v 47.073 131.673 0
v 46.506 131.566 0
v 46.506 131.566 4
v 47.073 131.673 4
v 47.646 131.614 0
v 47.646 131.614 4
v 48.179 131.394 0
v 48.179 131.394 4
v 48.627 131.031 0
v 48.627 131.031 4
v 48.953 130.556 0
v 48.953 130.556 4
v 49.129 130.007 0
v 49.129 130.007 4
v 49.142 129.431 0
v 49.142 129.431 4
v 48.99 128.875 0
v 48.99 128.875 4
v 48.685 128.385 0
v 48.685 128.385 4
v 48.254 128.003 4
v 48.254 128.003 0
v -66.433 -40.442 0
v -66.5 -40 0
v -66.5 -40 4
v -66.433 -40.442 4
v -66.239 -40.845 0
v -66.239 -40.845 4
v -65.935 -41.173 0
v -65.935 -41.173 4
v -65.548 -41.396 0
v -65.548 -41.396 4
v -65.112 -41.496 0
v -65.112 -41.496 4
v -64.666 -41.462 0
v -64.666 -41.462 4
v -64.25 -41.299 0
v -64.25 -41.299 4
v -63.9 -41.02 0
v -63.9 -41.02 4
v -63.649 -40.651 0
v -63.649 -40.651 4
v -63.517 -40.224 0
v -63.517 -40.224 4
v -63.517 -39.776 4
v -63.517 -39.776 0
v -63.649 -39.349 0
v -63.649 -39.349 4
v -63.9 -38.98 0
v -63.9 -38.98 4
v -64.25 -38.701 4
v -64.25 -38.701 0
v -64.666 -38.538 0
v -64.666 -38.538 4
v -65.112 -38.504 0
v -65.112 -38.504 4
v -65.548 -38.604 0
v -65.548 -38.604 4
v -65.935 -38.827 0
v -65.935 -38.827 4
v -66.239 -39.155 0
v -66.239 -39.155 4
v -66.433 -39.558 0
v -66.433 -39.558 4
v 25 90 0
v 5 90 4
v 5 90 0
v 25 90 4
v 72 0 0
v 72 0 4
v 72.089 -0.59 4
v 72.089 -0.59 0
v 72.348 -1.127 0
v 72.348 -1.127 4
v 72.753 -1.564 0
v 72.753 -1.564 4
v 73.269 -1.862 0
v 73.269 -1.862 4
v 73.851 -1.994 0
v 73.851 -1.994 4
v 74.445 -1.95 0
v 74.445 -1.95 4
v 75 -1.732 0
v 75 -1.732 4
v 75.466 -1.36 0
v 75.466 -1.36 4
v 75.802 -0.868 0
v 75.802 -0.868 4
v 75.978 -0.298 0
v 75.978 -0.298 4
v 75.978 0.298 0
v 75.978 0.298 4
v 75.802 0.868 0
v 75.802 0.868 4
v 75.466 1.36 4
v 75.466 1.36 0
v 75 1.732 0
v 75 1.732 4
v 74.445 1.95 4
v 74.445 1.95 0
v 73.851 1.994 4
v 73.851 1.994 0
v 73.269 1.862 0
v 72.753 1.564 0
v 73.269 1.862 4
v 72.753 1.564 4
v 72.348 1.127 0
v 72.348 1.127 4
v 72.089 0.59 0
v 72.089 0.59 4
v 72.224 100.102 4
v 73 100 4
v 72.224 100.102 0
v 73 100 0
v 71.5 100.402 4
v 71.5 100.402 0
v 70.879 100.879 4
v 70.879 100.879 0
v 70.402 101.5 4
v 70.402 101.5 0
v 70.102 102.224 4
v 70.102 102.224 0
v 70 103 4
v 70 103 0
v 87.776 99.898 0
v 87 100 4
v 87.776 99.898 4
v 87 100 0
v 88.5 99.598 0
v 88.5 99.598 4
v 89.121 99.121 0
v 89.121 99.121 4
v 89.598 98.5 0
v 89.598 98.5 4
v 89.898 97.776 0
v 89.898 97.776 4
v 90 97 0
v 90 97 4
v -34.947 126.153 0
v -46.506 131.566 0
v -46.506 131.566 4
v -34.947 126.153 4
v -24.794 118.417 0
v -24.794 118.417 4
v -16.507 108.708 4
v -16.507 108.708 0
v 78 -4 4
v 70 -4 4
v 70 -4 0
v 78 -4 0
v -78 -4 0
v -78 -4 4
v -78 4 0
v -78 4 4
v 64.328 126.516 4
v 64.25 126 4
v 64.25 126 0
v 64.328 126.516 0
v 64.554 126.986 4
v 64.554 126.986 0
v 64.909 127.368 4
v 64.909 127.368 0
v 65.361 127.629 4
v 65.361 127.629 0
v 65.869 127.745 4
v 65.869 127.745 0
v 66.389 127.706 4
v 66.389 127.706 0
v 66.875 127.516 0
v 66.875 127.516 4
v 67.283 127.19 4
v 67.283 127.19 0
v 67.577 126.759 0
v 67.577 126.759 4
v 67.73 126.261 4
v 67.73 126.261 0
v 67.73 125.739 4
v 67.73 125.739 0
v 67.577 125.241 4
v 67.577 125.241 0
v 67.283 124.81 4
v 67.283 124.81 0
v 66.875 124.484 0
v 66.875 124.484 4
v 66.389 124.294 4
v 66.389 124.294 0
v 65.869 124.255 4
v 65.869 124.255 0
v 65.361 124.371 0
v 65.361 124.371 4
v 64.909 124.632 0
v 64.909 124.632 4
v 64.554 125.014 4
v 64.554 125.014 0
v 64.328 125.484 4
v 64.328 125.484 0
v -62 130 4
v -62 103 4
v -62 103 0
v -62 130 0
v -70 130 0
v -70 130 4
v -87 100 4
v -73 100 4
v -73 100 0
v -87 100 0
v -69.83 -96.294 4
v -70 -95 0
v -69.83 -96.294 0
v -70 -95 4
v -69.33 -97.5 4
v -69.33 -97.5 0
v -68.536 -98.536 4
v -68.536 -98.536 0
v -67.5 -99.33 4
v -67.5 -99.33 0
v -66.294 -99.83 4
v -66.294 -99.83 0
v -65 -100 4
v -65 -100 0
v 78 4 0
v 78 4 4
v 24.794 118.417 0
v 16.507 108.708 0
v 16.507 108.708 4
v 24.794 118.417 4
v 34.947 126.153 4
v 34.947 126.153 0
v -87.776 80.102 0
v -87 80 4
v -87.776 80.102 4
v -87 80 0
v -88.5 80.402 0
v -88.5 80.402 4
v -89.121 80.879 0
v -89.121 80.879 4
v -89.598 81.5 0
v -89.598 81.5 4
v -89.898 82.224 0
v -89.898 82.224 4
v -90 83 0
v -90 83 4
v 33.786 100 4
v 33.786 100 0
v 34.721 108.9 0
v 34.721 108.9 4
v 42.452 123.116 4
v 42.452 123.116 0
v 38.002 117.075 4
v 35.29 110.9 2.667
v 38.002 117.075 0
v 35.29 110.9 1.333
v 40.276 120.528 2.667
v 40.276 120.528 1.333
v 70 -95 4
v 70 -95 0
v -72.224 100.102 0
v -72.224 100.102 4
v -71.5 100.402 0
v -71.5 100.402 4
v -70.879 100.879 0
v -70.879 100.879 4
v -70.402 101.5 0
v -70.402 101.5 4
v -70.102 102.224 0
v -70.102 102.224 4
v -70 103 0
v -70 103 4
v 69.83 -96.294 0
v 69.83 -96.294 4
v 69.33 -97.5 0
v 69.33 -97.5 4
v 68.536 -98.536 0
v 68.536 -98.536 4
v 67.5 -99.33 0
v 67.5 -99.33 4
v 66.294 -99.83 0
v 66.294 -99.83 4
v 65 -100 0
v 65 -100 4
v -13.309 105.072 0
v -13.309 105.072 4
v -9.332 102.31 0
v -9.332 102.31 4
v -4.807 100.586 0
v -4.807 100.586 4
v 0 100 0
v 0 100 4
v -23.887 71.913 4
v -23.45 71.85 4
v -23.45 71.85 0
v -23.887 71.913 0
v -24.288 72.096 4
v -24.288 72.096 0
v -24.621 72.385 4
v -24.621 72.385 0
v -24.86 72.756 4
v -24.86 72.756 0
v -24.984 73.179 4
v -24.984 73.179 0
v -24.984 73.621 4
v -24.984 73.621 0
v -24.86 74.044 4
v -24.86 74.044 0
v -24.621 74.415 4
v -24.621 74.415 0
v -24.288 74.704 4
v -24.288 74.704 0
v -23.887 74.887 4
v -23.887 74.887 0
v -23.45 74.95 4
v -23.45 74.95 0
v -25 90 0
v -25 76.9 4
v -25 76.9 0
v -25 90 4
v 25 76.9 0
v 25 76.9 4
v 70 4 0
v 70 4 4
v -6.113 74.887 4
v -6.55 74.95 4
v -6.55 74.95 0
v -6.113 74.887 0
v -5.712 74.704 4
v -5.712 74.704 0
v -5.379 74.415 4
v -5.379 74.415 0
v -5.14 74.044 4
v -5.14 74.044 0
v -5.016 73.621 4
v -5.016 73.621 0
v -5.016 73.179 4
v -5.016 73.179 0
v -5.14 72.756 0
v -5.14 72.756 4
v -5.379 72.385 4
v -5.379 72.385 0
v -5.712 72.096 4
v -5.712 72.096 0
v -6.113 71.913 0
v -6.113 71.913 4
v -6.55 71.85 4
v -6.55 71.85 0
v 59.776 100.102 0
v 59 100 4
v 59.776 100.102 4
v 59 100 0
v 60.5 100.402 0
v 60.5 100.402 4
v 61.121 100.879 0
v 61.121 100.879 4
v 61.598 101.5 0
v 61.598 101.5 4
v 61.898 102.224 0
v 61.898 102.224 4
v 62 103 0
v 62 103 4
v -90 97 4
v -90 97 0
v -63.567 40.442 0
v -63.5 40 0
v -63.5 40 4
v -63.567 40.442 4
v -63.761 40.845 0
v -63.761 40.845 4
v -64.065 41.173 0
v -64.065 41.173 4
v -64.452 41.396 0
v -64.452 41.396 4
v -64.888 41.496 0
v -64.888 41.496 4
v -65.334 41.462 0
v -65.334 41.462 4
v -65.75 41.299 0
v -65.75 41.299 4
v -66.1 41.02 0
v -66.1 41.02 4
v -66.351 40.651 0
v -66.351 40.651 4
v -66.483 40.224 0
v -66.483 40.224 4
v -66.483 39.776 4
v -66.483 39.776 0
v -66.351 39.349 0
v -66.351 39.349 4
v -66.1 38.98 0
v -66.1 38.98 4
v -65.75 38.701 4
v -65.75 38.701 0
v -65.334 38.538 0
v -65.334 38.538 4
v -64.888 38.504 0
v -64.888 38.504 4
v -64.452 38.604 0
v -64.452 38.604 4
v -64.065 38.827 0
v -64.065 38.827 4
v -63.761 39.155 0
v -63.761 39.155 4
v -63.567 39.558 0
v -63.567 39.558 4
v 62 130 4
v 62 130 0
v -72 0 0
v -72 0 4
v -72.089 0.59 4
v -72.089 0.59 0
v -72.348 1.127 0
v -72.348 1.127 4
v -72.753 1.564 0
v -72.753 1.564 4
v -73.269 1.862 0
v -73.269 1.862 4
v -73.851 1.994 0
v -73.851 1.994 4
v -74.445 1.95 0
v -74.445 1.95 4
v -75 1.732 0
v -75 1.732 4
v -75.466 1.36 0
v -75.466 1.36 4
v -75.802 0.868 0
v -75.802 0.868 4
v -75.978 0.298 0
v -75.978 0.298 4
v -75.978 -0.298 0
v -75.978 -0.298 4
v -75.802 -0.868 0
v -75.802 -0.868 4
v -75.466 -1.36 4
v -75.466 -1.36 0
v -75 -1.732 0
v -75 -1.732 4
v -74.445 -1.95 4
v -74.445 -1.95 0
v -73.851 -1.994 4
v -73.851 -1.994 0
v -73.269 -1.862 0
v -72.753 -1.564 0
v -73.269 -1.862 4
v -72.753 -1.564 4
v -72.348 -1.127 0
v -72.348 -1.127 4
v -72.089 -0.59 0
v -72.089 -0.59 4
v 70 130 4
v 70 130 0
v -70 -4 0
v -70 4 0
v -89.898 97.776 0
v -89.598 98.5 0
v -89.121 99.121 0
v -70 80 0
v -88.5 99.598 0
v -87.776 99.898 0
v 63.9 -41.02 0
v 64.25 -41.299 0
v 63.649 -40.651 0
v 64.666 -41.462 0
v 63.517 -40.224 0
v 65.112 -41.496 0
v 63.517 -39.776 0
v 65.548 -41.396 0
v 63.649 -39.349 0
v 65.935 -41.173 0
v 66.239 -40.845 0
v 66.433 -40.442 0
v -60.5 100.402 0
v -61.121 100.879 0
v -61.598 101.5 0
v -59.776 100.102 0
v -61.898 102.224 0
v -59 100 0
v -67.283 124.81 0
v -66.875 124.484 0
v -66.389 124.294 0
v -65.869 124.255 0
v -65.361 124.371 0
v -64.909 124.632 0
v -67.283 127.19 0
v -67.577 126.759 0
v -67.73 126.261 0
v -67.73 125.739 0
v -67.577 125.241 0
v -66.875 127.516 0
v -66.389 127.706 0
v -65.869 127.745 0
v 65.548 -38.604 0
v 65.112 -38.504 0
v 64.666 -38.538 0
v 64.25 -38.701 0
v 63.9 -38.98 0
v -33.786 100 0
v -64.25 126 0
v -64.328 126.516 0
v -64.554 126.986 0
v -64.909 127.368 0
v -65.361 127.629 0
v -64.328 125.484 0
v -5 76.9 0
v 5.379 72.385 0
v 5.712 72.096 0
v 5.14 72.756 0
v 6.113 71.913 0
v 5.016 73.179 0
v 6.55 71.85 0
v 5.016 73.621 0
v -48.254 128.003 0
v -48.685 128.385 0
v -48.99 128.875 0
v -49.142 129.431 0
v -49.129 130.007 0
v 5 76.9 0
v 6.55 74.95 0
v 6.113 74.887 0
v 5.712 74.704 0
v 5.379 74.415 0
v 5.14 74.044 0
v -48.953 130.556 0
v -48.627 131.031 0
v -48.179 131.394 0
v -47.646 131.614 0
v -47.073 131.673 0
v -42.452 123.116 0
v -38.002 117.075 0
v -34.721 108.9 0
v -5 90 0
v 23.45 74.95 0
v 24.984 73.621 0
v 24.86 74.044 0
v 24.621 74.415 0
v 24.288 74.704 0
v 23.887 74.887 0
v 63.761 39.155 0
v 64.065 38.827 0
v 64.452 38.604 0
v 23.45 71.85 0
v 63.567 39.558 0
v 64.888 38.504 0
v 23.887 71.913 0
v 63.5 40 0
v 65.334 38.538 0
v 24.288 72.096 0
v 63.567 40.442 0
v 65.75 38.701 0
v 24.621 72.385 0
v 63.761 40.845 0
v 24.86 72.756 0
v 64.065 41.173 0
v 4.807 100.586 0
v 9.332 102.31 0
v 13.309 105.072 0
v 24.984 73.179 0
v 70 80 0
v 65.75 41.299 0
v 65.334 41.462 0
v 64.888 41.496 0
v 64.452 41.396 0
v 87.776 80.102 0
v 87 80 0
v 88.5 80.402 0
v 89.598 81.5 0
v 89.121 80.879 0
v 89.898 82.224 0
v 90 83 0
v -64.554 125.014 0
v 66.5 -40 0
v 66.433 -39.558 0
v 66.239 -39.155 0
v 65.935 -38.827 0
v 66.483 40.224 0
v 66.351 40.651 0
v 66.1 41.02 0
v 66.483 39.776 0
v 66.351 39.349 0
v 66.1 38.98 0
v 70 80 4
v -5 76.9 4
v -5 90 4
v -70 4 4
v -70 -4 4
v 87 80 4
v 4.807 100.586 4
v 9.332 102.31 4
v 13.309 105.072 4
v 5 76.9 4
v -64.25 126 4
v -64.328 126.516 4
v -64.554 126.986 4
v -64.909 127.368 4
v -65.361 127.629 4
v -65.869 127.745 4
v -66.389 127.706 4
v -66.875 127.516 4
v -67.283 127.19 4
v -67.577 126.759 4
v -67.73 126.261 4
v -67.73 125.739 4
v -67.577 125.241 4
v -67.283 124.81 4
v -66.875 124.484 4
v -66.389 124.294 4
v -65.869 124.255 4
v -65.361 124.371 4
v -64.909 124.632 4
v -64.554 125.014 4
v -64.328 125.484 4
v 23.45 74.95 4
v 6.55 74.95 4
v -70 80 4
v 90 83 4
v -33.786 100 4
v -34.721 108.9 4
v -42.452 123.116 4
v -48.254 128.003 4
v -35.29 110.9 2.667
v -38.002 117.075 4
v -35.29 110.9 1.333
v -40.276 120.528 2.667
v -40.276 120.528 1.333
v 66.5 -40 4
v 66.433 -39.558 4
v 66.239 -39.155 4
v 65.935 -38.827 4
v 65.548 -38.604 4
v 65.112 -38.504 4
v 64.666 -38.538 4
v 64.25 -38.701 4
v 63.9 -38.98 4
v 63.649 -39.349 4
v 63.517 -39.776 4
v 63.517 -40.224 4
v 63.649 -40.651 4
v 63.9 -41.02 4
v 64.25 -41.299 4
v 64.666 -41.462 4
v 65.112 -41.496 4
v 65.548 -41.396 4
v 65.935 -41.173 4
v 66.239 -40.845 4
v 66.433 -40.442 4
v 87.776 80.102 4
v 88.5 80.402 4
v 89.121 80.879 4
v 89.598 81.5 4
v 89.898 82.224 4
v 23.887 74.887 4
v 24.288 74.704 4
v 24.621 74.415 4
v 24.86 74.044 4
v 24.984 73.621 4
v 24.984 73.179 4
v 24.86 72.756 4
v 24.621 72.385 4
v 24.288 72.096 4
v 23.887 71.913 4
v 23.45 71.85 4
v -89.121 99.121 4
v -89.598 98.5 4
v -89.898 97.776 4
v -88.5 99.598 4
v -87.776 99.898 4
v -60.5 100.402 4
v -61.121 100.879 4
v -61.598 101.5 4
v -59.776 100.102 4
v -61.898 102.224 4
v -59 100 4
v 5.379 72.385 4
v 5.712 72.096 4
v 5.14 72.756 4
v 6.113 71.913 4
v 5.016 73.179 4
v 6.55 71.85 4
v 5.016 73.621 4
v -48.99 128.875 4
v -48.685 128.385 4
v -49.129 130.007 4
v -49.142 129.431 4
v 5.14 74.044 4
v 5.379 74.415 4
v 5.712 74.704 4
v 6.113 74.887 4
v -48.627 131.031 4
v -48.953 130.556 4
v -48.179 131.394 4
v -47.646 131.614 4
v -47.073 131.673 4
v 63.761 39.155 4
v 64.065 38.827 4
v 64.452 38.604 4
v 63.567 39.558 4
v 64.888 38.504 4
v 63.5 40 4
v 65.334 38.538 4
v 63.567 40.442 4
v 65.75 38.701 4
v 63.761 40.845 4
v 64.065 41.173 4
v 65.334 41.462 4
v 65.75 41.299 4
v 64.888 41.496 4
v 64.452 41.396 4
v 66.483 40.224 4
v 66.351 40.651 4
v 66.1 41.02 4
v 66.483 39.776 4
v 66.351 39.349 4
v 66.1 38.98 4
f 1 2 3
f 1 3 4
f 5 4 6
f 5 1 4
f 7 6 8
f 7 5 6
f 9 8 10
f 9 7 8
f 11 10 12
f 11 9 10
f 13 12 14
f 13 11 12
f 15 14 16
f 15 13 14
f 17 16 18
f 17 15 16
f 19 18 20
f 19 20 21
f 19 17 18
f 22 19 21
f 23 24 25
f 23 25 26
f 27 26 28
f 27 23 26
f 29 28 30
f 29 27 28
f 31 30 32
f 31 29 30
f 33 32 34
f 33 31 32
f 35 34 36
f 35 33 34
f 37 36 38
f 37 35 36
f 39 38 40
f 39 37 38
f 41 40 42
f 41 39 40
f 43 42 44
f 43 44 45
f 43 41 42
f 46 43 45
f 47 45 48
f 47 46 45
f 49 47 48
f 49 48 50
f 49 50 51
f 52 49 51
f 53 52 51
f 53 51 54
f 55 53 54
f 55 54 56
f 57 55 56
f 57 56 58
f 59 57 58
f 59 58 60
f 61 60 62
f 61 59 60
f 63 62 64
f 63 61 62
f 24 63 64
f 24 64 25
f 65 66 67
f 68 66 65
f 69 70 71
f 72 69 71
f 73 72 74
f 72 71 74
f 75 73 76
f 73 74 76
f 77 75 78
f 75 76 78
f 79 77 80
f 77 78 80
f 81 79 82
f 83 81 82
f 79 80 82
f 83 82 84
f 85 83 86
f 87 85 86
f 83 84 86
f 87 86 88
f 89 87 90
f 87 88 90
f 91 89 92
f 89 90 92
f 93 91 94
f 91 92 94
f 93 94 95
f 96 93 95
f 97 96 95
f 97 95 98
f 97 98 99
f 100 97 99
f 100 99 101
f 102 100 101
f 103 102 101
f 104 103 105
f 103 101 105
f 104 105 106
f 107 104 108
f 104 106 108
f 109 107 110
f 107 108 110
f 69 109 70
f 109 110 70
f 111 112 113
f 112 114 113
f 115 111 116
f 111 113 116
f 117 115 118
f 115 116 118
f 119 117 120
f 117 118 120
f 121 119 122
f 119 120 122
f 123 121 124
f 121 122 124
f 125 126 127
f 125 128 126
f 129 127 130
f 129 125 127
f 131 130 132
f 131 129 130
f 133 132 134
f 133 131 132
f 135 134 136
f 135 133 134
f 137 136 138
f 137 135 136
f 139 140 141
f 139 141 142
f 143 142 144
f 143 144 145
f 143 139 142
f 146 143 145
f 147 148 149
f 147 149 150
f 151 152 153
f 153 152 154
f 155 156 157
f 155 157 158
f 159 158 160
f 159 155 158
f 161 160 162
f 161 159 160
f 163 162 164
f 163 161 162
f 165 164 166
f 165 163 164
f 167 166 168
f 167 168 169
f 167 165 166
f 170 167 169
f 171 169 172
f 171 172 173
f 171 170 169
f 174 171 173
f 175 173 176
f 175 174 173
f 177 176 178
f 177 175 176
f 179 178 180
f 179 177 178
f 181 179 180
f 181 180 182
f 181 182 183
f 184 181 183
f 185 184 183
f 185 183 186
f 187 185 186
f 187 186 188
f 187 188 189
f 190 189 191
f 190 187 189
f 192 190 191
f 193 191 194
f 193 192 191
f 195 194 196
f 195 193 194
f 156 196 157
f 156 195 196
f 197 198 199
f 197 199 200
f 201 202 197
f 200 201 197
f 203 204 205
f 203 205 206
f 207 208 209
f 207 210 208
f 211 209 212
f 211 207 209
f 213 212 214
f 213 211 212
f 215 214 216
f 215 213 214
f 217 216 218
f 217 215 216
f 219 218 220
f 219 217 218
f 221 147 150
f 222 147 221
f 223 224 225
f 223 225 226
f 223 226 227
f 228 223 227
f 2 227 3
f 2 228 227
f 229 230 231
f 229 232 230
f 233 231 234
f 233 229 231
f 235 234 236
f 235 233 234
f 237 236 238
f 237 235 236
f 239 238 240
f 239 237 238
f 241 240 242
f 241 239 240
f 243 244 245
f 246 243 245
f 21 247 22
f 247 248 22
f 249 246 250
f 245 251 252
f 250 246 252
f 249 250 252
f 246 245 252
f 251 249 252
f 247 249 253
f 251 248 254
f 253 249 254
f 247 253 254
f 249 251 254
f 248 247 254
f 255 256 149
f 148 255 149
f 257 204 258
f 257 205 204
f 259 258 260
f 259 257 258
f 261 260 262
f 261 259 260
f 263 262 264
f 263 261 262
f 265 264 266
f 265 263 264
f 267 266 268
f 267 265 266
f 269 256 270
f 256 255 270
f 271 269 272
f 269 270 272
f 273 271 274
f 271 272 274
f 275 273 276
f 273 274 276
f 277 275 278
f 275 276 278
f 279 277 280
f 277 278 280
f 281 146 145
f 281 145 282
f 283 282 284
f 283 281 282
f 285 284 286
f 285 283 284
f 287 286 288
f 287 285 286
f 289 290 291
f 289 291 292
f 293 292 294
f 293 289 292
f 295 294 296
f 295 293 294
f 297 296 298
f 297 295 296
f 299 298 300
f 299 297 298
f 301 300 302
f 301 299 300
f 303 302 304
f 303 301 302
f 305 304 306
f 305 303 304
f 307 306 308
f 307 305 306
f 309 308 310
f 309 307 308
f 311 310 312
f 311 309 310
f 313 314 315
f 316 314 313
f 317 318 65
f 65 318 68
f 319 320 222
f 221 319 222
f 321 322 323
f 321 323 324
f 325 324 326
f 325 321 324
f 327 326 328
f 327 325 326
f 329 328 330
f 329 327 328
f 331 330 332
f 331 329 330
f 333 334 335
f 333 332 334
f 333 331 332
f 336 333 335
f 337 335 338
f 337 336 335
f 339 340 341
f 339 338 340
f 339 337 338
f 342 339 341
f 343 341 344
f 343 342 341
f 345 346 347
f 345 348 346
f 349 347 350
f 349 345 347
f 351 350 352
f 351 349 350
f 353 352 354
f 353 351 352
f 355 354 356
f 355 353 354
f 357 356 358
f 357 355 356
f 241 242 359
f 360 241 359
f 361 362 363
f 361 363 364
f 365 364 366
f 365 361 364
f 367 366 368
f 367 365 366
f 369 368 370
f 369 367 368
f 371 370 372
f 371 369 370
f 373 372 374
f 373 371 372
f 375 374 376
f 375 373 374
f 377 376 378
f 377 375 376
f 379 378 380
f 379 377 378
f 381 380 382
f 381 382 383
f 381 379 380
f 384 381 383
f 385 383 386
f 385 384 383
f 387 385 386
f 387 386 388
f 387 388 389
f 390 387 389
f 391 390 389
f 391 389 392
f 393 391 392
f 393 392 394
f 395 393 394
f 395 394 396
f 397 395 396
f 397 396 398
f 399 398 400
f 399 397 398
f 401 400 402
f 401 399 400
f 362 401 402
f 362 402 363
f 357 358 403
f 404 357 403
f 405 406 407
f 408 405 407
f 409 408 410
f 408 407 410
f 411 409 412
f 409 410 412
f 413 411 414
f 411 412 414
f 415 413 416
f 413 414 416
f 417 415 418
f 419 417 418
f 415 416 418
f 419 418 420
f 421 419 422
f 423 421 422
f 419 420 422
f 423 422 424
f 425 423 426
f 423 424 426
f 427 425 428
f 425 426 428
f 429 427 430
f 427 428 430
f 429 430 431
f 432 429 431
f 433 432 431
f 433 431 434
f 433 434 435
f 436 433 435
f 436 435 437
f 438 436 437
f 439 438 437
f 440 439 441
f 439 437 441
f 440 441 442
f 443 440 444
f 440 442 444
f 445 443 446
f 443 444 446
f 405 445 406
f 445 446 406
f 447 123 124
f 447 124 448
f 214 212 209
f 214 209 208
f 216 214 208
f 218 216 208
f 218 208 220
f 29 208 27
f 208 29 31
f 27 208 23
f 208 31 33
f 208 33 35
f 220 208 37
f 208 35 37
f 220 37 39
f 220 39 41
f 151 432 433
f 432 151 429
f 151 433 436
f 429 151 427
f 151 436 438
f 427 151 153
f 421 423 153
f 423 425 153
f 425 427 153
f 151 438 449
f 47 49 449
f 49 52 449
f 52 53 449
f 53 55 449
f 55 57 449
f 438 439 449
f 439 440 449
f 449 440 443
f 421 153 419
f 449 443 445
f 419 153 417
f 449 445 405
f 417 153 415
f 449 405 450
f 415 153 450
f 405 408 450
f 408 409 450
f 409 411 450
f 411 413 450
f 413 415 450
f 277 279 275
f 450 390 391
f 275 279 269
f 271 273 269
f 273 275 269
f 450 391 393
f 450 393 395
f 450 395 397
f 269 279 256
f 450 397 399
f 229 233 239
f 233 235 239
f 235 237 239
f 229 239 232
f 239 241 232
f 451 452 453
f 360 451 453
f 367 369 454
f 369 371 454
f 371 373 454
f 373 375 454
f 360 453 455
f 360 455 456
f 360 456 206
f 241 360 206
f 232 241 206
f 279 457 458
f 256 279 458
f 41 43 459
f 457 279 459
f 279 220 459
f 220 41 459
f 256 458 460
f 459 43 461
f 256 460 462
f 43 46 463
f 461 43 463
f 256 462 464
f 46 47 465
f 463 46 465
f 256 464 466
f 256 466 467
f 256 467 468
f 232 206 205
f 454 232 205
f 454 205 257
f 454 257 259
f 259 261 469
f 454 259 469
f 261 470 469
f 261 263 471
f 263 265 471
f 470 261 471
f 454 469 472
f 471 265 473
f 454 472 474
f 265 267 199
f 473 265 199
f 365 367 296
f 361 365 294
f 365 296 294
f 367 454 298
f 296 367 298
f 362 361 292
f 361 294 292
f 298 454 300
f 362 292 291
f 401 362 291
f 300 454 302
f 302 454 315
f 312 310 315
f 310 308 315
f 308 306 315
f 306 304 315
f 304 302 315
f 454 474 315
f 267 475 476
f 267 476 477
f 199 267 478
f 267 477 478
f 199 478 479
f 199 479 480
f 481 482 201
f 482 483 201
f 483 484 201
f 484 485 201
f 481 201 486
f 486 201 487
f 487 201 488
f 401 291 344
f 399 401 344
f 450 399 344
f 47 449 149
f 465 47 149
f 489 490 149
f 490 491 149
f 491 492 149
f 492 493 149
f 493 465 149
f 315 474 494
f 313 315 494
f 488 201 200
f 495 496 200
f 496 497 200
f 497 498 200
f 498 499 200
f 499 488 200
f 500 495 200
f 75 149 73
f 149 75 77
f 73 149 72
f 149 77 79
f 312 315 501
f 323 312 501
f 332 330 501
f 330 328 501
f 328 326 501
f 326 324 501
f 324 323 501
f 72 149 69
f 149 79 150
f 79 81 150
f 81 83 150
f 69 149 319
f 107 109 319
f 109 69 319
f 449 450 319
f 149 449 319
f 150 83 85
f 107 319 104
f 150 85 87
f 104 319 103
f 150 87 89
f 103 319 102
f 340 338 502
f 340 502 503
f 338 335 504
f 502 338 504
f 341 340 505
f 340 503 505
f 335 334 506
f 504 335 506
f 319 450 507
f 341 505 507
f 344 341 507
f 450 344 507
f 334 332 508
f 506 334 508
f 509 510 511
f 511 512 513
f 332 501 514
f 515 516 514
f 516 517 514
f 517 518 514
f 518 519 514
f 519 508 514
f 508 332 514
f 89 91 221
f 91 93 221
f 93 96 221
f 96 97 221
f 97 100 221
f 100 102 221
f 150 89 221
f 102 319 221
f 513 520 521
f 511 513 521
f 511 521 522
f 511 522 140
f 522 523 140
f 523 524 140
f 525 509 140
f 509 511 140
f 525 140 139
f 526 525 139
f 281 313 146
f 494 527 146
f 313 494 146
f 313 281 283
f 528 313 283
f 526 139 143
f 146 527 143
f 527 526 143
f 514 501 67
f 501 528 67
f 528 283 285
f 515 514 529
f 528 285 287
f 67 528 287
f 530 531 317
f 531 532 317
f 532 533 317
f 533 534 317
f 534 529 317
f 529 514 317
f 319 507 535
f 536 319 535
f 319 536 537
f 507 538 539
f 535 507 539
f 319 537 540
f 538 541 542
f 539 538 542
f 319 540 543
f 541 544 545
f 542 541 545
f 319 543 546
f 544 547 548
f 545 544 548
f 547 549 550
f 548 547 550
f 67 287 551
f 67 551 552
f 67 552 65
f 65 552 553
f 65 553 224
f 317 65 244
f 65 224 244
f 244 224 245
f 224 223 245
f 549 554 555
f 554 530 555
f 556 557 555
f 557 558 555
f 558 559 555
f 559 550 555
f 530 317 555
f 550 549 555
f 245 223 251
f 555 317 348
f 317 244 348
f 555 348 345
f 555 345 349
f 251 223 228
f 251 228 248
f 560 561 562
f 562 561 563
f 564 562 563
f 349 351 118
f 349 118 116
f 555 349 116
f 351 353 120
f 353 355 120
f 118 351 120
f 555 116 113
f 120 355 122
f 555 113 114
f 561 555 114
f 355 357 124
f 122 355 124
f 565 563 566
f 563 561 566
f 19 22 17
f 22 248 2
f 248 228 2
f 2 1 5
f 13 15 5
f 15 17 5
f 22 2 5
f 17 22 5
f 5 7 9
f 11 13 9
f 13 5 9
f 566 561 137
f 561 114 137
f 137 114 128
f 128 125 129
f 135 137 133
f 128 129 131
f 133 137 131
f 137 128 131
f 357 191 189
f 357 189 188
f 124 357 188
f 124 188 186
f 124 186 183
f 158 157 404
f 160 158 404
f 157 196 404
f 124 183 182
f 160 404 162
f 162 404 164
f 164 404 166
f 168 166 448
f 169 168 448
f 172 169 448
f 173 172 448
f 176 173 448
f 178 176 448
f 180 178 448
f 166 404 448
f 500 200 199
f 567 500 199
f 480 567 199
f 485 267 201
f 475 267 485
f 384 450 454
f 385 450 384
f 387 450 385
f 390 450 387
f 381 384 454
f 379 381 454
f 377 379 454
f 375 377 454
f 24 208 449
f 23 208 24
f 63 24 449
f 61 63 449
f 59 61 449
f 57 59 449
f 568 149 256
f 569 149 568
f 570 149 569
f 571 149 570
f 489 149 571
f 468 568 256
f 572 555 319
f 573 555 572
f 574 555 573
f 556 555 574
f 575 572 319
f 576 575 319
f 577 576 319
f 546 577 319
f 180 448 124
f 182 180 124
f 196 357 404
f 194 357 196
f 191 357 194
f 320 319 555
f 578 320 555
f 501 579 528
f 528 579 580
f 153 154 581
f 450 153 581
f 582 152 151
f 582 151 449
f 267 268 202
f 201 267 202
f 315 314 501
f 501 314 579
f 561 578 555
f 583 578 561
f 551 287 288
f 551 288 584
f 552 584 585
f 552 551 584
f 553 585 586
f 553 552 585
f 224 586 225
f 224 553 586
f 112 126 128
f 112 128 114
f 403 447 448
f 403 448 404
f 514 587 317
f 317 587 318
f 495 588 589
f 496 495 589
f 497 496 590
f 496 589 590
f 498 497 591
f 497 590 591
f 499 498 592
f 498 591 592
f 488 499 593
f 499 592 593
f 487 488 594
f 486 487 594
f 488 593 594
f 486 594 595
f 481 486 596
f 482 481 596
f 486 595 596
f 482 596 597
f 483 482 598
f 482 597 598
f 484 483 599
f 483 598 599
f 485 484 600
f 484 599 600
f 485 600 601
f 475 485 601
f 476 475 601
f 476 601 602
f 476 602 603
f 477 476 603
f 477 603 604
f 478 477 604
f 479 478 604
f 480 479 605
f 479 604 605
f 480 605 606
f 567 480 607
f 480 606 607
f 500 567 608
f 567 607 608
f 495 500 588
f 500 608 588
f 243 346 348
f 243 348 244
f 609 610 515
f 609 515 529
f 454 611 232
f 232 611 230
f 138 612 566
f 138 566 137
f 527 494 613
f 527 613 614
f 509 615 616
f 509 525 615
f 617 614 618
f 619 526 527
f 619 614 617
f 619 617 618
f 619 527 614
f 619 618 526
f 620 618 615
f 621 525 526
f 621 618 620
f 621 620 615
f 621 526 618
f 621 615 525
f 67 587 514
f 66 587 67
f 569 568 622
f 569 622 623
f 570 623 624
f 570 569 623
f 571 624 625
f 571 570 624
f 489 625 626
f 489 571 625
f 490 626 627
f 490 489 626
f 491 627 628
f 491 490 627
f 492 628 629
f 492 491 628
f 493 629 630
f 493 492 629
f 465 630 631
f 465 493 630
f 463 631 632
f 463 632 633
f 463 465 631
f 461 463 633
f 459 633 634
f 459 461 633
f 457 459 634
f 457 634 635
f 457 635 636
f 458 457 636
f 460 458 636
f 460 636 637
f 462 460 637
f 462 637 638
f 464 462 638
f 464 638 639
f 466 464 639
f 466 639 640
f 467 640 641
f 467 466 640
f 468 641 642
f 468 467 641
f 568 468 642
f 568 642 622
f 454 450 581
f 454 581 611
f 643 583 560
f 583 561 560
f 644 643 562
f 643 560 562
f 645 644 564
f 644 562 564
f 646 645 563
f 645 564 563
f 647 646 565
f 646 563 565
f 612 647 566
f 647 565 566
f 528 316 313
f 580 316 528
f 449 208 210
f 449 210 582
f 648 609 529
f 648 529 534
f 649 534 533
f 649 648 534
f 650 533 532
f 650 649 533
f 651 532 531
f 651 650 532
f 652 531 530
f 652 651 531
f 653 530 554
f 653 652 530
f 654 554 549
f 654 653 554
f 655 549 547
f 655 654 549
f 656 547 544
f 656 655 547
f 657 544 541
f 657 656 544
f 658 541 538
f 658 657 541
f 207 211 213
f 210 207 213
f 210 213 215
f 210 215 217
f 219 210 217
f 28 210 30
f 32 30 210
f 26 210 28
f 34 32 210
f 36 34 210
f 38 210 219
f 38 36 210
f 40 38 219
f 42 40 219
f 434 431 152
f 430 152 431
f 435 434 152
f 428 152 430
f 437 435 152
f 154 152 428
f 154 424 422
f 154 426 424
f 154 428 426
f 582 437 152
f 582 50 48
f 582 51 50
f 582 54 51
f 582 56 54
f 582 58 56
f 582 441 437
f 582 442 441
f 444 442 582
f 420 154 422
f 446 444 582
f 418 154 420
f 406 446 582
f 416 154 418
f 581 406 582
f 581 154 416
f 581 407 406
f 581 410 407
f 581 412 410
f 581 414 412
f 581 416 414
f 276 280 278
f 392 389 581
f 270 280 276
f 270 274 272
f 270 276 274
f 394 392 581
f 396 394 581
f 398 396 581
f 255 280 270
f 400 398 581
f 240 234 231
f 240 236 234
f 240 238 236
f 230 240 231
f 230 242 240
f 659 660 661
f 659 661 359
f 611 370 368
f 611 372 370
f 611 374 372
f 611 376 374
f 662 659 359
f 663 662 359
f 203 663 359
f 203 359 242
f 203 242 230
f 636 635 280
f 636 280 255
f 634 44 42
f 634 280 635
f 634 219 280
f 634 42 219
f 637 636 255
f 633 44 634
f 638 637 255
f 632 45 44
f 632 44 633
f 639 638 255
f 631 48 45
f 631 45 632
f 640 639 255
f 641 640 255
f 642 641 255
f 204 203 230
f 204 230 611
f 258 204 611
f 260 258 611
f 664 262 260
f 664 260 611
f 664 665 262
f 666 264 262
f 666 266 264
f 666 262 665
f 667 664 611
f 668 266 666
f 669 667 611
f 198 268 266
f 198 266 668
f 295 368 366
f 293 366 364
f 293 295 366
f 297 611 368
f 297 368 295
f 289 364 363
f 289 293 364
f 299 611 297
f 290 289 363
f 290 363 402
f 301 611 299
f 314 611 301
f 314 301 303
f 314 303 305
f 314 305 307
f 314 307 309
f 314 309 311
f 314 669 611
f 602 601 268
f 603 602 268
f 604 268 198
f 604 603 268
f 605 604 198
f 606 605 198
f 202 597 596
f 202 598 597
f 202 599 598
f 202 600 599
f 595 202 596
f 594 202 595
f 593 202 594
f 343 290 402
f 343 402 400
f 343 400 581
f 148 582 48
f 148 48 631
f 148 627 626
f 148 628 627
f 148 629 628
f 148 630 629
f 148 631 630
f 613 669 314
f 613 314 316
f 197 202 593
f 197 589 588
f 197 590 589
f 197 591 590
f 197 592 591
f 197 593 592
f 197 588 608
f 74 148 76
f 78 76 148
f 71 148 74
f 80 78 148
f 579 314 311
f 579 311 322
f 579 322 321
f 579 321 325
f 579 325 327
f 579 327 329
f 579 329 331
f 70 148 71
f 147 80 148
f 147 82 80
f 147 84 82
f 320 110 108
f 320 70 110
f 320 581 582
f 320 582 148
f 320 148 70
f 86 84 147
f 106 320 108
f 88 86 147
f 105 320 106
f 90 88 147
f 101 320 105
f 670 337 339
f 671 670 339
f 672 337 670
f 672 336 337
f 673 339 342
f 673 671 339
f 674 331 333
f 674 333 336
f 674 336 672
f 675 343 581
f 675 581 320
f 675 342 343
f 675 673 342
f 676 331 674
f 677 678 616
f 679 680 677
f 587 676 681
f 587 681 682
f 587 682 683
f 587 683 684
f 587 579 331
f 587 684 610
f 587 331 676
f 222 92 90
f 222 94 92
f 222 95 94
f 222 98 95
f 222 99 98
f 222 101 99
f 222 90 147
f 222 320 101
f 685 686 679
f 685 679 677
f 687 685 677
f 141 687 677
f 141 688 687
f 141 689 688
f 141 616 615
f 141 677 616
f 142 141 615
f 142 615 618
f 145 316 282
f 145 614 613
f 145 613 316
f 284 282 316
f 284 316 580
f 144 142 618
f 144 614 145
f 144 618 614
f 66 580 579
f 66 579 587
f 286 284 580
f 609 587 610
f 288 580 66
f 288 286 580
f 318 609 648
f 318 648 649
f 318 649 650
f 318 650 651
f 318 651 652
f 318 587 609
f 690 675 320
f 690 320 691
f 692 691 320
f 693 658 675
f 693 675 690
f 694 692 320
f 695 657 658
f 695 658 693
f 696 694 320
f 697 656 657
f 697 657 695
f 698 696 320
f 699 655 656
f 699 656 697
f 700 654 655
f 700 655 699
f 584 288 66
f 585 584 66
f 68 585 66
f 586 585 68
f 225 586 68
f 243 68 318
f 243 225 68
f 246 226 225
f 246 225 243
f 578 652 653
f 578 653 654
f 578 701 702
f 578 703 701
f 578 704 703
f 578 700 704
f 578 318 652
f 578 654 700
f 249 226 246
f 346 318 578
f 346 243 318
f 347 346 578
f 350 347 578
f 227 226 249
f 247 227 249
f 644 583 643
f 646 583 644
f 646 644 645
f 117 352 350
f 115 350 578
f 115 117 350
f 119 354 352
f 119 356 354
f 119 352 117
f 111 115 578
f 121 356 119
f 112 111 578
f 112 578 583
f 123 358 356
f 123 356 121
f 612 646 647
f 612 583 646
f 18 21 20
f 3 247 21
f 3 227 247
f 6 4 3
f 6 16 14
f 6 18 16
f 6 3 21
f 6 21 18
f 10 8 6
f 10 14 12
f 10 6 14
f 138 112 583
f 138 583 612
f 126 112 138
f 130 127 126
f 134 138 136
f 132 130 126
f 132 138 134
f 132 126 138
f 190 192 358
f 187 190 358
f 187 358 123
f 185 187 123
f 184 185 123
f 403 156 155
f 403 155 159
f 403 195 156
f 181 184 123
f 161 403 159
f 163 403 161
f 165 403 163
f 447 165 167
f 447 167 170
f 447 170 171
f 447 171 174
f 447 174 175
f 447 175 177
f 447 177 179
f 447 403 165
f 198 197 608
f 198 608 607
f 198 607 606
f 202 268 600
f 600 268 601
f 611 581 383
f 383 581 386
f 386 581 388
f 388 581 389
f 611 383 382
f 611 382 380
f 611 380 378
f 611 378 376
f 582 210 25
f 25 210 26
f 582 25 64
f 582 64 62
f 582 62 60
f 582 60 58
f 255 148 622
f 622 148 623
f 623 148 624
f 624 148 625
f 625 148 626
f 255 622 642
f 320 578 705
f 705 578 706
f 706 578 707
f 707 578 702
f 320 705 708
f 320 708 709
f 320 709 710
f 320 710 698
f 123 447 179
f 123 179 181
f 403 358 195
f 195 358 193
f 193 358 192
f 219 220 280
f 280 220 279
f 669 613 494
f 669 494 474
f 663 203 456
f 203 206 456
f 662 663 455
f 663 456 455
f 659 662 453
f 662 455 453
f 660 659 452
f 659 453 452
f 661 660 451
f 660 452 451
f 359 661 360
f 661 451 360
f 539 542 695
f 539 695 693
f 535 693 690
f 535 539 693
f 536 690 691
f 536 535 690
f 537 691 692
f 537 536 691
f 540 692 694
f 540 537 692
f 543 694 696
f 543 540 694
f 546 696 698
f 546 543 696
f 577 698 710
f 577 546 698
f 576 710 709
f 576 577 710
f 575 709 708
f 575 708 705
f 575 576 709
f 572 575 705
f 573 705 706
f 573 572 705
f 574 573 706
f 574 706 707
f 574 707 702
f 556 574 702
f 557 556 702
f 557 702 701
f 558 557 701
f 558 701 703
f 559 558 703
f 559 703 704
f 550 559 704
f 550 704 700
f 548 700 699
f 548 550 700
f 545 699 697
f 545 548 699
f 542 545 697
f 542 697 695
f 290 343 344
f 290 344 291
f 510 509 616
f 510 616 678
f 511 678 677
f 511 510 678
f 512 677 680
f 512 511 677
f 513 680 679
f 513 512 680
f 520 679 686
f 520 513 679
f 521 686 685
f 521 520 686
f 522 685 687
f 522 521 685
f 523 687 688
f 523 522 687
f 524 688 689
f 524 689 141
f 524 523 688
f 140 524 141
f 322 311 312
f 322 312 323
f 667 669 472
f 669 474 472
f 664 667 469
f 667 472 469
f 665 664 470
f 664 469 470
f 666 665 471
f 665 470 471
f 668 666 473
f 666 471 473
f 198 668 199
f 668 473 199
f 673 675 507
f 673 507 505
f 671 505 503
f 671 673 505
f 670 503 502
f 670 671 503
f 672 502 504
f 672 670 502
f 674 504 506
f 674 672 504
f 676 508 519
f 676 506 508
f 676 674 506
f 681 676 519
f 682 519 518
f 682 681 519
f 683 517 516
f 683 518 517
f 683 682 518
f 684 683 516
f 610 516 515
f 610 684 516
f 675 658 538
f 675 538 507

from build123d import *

# Parameters (mm, degrees)
SKETCH_1_W             = 140
SKETCH_1_H             = 200
SKETCH_1_R             = 1.5
EXTRUDE_1_DEPTH        = 4
SKETCH_2_W             = 20
SKETCH_2_H             = 20
EXTRUDE_2_DEPTH        = 4
FILLET_1_R             = 3
FILLET_1_OF_MIRROR_1_R = 3
SKETCH_3_W             = 8
SKETCH_3_H             = 30
SKETCH_3_R             = 1.75
EXTRUDE_3_DEPTH        = 4
FILLET_2_R             = 3
FILLET_2_OF_MIRROR_2_R = 3
FILLET_3_R             = 5
EXTRUDE_4_DEPTH        = 4
SKETCH_5_W             = 8
SKETCH_5_H             = 8
SKETCH_5_R             = 2
EXTRUDE_5_DEPTH        = 4
SKETCH_6_W             = 20
SKETCH_6_H             = 13.1
CUT_EXTRUDE_1_DEPTH    = 10


with BuildPart() as part:
    # 草图1 → 凸台-拉伸1 (new body)
    with BuildSketch(Plane.XY):
        Rectangle(SKETCH_1_W, SKETCH_1_H)
        with Locations((-65, 40)):
            Circle(SKETCH_1_R, mode=Mode.SUBTRACT)
        with Locations(Location((-65, -40, 0), (0, 0, 180))):
            Circle(SKETCH_1_R, mode=Mode.SUBTRACT)
        with Locations((65, -40)):
            Circle(SKETCH_1_R, mode=Mode.SUBTRACT)
        with Locations(Location((65, 40, 0), (0, 0, 180))):
            Circle(SKETCH_1_R, mode=Mode.SUBTRACT)
    extrude(amount=EXTRUDE_1_DEPTH)

    # 草图2 → 凸台-拉伸2 (add)
    with BuildSketch(Plane.XY.offset(4)):
        with Locations((80, 90)):
            Rectangle(SKETCH_2_W, SKETCH_2_H)
    extrude_2 = extrude(amount=-EXTRUDE_2_DEPTH)

    # 圆角1
    fillet_1_edges = [part.edges().sort_by_distance(p)[0] for p in [
        (90, 100, 2),
        (90, 80, 2),
    ]]
    fillet(fillet_1_edges, radius=FILLET_1_R)

    # 镜向1: 凸台-拉伸2 across plane
    add(extrude_2.mirror(Plane(origin=(0, 0, 0), x_dir=(0, 0, 1), z_dir=(1, 0, 0))))

    # 圆角1 of 镜向1
    fillet_1_of_mirror_1_edges = [part.edges().sort_by_distance(p)[0] for p in [
        (-90, 100, 2),
        (-90, 80, 2),
    ]]
    fillet(fillet_1_of_mirror_1_edges, radius=FILLET_1_OF_MIRROR_1_R)

    # 草图3 → 凸台-拉伸3 (add)
    with BuildSketch(Plane.XY.offset(4)):
        with Locations((-66, 115)):
            Rectangle(SKETCH_3_W, SKETCH_3_H)
        with Locations((-66, 126)):
            Circle(SKETCH_3_R, mode=Mode.SUBTRACT)
    extrude_3 = extrude(amount=-EXTRUDE_3_DEPTH)

    # 圆角2
    fillet_2_edges = [part.edges().sort_by_distance(p)[0] for p in [
        (-70, 100, 2),
        (-62, 100, 2),
    ]]
    fillet(fillet_2_edges, radius=FILLET_2_R)

    # 镜向2: 凸台-拉伸3 across plane
    add(extrude_3.mirror(Plane(origin=(0, 0, 0), x_dir=(0, 0, 1), z_dir=(1, 0, 0))))

    # 圆角2 of 镜向2
    fillet_2_of_mirror_2_edges = [part.edges().sort_by_distance(p)[0] for p in [
        (70, 100, 2),
        (62, 100, 2),
    ]]
    fillet(fillet_2_of_mirror_2_edges, radius=FILLET_2_OF_MIRROR_2_R)

    # 圆角3
    fillet_3_edges = [part.edges().sort_by_distance(p)[0] for p in [
        (-70, -100, 2),
        (70, -100, 2),
    ]]
    fillet(fillet_3_edges, radius=FILLET_3_R)

    # 草图4 → 凸台-拉伸4 (add)
    with BuildSketch(Plane(origin=(0, 0, 0), x_dir=(-1, 0, 0), z_dir=(0, 0, -1))):
        with BuildLine():
            add(Edge.make_bspline(
                [(-33.786379938, 100), (-33.384771108, 111.24314249), (-38.944167614, 121.897129031), (-48.25387443, 128.002822688)],
                knots=[0, 0, 0, 0, 0.66194058, 0.66194058, 0.66194058, 0.66194058], degree=3))
            Line((-33.786379938, 100), (0, 100))
            ThreePointArc((0, 100), (-9.331566745, 102.310402433), (-16.507166038, 108.707813791))
            ThreePointArc((-16.507166038, 108.707813791), (-29.663945789, 122.555538901), (-46.506293223, 131.566403293))
            ThreePointArc((-46.506293223, 131.566403293), (-48.952735362, 130.555841868), (-48.25387443, 128.002822688))
        make_face()
        with BuildLine():
            ThreePointArc((16.507166038, 108.707813791), (9.331566745, 102.310402433), (0, 100))
            Line((0, 100), (33.786379938, 100))
            add(Edge.make_bspline(
                [(33.786379938, 100), (33.384771108, 111.24314249), (38.944167614, 121.897129031), (48.25387443, 128.002822688)],
                knots=[0, 0, 0, 0, 0.66194058, 0.66194058, 0.66194058, 0.66194058], degree=3))
            ThreePointArc((48.25387443, 128.002822688), (48.952735362, 130.555841868), (46.506293223, 131.566403293))
            ThreePointArc((46.506293223, 131.566403293), (29.663945789, 122.555538901), (16.507166038, 108.707813791))
        make_face()
    extrude(amount=-EXTRUDE_4_DEPTH)

    # 草图5 → 凸台-拉伸5 (add)
    # profile 1 of 2: a face of its own
    with BuildSketch(Plane.XY.offset(4)):
        with Locations((-74, 0)):
            Rectangle(SKETCH_5_W, SKETCH_5_H)
        with Locations((-74, 0)):
            Circle(SKETCH_5_R, mode=Mode.SUBTRACT)
    # profile 2 of 2: a face of its own
    with BuildSketch(Plane.XY.offset(4)):
        with Locations((74, 0)):
            Rectangle(SKETCH_5_W, SKETCH_5_H)
        with Locations(Location((74, 0, 0), (0, 0, 180))):
            Circle(SKETCH_5_R, mode=Mode.SUBTRACT)
    extrude(amount=-EXTRUDE_5_DEPTH)

    # 草图6 → 切除-拉伸1 (cut)
    with BuildSketch(Plane.XY.offset(4)):
        with Locations((-15, 83.45)):
            Rectangle(SKETCH_6_W, SKETCH_6_H)
        with Locations((15, 83.45)):
            Rectangle(SKETCH_6_W, SKETCH_6_H)
        with BuildLine():
            Line((-23.45, 74.95), (-6.55, 74.95))
            ThreePointArc((-6.55, 74.95), (-5, 73.4), (-6.55, 71.85))
            Line((-6.55, 71.85), (-23.45, 71.85))
            ThreePointArc((-23.45, 71.85), (-25, 73.4), (-23.45, 74.95))
        make_face()
        with BuildLine():
            Line((23.45, 71.85), (6.55, 71.85))
            ThreePointArc((6.55, 71.85), (5, 73.4), (6.55, 74.95))
            Line((6.55, 74.95), (23.45, 74.95))
            ThreePointArc((23.45, 74.95), (25, 73.4), (23.45, 71.85))
        make_face()
    extrude(amount=-CUT_EXTRUDE_1_DEPTH, mode=Mode.SUBTRACT)


solid = part.part
